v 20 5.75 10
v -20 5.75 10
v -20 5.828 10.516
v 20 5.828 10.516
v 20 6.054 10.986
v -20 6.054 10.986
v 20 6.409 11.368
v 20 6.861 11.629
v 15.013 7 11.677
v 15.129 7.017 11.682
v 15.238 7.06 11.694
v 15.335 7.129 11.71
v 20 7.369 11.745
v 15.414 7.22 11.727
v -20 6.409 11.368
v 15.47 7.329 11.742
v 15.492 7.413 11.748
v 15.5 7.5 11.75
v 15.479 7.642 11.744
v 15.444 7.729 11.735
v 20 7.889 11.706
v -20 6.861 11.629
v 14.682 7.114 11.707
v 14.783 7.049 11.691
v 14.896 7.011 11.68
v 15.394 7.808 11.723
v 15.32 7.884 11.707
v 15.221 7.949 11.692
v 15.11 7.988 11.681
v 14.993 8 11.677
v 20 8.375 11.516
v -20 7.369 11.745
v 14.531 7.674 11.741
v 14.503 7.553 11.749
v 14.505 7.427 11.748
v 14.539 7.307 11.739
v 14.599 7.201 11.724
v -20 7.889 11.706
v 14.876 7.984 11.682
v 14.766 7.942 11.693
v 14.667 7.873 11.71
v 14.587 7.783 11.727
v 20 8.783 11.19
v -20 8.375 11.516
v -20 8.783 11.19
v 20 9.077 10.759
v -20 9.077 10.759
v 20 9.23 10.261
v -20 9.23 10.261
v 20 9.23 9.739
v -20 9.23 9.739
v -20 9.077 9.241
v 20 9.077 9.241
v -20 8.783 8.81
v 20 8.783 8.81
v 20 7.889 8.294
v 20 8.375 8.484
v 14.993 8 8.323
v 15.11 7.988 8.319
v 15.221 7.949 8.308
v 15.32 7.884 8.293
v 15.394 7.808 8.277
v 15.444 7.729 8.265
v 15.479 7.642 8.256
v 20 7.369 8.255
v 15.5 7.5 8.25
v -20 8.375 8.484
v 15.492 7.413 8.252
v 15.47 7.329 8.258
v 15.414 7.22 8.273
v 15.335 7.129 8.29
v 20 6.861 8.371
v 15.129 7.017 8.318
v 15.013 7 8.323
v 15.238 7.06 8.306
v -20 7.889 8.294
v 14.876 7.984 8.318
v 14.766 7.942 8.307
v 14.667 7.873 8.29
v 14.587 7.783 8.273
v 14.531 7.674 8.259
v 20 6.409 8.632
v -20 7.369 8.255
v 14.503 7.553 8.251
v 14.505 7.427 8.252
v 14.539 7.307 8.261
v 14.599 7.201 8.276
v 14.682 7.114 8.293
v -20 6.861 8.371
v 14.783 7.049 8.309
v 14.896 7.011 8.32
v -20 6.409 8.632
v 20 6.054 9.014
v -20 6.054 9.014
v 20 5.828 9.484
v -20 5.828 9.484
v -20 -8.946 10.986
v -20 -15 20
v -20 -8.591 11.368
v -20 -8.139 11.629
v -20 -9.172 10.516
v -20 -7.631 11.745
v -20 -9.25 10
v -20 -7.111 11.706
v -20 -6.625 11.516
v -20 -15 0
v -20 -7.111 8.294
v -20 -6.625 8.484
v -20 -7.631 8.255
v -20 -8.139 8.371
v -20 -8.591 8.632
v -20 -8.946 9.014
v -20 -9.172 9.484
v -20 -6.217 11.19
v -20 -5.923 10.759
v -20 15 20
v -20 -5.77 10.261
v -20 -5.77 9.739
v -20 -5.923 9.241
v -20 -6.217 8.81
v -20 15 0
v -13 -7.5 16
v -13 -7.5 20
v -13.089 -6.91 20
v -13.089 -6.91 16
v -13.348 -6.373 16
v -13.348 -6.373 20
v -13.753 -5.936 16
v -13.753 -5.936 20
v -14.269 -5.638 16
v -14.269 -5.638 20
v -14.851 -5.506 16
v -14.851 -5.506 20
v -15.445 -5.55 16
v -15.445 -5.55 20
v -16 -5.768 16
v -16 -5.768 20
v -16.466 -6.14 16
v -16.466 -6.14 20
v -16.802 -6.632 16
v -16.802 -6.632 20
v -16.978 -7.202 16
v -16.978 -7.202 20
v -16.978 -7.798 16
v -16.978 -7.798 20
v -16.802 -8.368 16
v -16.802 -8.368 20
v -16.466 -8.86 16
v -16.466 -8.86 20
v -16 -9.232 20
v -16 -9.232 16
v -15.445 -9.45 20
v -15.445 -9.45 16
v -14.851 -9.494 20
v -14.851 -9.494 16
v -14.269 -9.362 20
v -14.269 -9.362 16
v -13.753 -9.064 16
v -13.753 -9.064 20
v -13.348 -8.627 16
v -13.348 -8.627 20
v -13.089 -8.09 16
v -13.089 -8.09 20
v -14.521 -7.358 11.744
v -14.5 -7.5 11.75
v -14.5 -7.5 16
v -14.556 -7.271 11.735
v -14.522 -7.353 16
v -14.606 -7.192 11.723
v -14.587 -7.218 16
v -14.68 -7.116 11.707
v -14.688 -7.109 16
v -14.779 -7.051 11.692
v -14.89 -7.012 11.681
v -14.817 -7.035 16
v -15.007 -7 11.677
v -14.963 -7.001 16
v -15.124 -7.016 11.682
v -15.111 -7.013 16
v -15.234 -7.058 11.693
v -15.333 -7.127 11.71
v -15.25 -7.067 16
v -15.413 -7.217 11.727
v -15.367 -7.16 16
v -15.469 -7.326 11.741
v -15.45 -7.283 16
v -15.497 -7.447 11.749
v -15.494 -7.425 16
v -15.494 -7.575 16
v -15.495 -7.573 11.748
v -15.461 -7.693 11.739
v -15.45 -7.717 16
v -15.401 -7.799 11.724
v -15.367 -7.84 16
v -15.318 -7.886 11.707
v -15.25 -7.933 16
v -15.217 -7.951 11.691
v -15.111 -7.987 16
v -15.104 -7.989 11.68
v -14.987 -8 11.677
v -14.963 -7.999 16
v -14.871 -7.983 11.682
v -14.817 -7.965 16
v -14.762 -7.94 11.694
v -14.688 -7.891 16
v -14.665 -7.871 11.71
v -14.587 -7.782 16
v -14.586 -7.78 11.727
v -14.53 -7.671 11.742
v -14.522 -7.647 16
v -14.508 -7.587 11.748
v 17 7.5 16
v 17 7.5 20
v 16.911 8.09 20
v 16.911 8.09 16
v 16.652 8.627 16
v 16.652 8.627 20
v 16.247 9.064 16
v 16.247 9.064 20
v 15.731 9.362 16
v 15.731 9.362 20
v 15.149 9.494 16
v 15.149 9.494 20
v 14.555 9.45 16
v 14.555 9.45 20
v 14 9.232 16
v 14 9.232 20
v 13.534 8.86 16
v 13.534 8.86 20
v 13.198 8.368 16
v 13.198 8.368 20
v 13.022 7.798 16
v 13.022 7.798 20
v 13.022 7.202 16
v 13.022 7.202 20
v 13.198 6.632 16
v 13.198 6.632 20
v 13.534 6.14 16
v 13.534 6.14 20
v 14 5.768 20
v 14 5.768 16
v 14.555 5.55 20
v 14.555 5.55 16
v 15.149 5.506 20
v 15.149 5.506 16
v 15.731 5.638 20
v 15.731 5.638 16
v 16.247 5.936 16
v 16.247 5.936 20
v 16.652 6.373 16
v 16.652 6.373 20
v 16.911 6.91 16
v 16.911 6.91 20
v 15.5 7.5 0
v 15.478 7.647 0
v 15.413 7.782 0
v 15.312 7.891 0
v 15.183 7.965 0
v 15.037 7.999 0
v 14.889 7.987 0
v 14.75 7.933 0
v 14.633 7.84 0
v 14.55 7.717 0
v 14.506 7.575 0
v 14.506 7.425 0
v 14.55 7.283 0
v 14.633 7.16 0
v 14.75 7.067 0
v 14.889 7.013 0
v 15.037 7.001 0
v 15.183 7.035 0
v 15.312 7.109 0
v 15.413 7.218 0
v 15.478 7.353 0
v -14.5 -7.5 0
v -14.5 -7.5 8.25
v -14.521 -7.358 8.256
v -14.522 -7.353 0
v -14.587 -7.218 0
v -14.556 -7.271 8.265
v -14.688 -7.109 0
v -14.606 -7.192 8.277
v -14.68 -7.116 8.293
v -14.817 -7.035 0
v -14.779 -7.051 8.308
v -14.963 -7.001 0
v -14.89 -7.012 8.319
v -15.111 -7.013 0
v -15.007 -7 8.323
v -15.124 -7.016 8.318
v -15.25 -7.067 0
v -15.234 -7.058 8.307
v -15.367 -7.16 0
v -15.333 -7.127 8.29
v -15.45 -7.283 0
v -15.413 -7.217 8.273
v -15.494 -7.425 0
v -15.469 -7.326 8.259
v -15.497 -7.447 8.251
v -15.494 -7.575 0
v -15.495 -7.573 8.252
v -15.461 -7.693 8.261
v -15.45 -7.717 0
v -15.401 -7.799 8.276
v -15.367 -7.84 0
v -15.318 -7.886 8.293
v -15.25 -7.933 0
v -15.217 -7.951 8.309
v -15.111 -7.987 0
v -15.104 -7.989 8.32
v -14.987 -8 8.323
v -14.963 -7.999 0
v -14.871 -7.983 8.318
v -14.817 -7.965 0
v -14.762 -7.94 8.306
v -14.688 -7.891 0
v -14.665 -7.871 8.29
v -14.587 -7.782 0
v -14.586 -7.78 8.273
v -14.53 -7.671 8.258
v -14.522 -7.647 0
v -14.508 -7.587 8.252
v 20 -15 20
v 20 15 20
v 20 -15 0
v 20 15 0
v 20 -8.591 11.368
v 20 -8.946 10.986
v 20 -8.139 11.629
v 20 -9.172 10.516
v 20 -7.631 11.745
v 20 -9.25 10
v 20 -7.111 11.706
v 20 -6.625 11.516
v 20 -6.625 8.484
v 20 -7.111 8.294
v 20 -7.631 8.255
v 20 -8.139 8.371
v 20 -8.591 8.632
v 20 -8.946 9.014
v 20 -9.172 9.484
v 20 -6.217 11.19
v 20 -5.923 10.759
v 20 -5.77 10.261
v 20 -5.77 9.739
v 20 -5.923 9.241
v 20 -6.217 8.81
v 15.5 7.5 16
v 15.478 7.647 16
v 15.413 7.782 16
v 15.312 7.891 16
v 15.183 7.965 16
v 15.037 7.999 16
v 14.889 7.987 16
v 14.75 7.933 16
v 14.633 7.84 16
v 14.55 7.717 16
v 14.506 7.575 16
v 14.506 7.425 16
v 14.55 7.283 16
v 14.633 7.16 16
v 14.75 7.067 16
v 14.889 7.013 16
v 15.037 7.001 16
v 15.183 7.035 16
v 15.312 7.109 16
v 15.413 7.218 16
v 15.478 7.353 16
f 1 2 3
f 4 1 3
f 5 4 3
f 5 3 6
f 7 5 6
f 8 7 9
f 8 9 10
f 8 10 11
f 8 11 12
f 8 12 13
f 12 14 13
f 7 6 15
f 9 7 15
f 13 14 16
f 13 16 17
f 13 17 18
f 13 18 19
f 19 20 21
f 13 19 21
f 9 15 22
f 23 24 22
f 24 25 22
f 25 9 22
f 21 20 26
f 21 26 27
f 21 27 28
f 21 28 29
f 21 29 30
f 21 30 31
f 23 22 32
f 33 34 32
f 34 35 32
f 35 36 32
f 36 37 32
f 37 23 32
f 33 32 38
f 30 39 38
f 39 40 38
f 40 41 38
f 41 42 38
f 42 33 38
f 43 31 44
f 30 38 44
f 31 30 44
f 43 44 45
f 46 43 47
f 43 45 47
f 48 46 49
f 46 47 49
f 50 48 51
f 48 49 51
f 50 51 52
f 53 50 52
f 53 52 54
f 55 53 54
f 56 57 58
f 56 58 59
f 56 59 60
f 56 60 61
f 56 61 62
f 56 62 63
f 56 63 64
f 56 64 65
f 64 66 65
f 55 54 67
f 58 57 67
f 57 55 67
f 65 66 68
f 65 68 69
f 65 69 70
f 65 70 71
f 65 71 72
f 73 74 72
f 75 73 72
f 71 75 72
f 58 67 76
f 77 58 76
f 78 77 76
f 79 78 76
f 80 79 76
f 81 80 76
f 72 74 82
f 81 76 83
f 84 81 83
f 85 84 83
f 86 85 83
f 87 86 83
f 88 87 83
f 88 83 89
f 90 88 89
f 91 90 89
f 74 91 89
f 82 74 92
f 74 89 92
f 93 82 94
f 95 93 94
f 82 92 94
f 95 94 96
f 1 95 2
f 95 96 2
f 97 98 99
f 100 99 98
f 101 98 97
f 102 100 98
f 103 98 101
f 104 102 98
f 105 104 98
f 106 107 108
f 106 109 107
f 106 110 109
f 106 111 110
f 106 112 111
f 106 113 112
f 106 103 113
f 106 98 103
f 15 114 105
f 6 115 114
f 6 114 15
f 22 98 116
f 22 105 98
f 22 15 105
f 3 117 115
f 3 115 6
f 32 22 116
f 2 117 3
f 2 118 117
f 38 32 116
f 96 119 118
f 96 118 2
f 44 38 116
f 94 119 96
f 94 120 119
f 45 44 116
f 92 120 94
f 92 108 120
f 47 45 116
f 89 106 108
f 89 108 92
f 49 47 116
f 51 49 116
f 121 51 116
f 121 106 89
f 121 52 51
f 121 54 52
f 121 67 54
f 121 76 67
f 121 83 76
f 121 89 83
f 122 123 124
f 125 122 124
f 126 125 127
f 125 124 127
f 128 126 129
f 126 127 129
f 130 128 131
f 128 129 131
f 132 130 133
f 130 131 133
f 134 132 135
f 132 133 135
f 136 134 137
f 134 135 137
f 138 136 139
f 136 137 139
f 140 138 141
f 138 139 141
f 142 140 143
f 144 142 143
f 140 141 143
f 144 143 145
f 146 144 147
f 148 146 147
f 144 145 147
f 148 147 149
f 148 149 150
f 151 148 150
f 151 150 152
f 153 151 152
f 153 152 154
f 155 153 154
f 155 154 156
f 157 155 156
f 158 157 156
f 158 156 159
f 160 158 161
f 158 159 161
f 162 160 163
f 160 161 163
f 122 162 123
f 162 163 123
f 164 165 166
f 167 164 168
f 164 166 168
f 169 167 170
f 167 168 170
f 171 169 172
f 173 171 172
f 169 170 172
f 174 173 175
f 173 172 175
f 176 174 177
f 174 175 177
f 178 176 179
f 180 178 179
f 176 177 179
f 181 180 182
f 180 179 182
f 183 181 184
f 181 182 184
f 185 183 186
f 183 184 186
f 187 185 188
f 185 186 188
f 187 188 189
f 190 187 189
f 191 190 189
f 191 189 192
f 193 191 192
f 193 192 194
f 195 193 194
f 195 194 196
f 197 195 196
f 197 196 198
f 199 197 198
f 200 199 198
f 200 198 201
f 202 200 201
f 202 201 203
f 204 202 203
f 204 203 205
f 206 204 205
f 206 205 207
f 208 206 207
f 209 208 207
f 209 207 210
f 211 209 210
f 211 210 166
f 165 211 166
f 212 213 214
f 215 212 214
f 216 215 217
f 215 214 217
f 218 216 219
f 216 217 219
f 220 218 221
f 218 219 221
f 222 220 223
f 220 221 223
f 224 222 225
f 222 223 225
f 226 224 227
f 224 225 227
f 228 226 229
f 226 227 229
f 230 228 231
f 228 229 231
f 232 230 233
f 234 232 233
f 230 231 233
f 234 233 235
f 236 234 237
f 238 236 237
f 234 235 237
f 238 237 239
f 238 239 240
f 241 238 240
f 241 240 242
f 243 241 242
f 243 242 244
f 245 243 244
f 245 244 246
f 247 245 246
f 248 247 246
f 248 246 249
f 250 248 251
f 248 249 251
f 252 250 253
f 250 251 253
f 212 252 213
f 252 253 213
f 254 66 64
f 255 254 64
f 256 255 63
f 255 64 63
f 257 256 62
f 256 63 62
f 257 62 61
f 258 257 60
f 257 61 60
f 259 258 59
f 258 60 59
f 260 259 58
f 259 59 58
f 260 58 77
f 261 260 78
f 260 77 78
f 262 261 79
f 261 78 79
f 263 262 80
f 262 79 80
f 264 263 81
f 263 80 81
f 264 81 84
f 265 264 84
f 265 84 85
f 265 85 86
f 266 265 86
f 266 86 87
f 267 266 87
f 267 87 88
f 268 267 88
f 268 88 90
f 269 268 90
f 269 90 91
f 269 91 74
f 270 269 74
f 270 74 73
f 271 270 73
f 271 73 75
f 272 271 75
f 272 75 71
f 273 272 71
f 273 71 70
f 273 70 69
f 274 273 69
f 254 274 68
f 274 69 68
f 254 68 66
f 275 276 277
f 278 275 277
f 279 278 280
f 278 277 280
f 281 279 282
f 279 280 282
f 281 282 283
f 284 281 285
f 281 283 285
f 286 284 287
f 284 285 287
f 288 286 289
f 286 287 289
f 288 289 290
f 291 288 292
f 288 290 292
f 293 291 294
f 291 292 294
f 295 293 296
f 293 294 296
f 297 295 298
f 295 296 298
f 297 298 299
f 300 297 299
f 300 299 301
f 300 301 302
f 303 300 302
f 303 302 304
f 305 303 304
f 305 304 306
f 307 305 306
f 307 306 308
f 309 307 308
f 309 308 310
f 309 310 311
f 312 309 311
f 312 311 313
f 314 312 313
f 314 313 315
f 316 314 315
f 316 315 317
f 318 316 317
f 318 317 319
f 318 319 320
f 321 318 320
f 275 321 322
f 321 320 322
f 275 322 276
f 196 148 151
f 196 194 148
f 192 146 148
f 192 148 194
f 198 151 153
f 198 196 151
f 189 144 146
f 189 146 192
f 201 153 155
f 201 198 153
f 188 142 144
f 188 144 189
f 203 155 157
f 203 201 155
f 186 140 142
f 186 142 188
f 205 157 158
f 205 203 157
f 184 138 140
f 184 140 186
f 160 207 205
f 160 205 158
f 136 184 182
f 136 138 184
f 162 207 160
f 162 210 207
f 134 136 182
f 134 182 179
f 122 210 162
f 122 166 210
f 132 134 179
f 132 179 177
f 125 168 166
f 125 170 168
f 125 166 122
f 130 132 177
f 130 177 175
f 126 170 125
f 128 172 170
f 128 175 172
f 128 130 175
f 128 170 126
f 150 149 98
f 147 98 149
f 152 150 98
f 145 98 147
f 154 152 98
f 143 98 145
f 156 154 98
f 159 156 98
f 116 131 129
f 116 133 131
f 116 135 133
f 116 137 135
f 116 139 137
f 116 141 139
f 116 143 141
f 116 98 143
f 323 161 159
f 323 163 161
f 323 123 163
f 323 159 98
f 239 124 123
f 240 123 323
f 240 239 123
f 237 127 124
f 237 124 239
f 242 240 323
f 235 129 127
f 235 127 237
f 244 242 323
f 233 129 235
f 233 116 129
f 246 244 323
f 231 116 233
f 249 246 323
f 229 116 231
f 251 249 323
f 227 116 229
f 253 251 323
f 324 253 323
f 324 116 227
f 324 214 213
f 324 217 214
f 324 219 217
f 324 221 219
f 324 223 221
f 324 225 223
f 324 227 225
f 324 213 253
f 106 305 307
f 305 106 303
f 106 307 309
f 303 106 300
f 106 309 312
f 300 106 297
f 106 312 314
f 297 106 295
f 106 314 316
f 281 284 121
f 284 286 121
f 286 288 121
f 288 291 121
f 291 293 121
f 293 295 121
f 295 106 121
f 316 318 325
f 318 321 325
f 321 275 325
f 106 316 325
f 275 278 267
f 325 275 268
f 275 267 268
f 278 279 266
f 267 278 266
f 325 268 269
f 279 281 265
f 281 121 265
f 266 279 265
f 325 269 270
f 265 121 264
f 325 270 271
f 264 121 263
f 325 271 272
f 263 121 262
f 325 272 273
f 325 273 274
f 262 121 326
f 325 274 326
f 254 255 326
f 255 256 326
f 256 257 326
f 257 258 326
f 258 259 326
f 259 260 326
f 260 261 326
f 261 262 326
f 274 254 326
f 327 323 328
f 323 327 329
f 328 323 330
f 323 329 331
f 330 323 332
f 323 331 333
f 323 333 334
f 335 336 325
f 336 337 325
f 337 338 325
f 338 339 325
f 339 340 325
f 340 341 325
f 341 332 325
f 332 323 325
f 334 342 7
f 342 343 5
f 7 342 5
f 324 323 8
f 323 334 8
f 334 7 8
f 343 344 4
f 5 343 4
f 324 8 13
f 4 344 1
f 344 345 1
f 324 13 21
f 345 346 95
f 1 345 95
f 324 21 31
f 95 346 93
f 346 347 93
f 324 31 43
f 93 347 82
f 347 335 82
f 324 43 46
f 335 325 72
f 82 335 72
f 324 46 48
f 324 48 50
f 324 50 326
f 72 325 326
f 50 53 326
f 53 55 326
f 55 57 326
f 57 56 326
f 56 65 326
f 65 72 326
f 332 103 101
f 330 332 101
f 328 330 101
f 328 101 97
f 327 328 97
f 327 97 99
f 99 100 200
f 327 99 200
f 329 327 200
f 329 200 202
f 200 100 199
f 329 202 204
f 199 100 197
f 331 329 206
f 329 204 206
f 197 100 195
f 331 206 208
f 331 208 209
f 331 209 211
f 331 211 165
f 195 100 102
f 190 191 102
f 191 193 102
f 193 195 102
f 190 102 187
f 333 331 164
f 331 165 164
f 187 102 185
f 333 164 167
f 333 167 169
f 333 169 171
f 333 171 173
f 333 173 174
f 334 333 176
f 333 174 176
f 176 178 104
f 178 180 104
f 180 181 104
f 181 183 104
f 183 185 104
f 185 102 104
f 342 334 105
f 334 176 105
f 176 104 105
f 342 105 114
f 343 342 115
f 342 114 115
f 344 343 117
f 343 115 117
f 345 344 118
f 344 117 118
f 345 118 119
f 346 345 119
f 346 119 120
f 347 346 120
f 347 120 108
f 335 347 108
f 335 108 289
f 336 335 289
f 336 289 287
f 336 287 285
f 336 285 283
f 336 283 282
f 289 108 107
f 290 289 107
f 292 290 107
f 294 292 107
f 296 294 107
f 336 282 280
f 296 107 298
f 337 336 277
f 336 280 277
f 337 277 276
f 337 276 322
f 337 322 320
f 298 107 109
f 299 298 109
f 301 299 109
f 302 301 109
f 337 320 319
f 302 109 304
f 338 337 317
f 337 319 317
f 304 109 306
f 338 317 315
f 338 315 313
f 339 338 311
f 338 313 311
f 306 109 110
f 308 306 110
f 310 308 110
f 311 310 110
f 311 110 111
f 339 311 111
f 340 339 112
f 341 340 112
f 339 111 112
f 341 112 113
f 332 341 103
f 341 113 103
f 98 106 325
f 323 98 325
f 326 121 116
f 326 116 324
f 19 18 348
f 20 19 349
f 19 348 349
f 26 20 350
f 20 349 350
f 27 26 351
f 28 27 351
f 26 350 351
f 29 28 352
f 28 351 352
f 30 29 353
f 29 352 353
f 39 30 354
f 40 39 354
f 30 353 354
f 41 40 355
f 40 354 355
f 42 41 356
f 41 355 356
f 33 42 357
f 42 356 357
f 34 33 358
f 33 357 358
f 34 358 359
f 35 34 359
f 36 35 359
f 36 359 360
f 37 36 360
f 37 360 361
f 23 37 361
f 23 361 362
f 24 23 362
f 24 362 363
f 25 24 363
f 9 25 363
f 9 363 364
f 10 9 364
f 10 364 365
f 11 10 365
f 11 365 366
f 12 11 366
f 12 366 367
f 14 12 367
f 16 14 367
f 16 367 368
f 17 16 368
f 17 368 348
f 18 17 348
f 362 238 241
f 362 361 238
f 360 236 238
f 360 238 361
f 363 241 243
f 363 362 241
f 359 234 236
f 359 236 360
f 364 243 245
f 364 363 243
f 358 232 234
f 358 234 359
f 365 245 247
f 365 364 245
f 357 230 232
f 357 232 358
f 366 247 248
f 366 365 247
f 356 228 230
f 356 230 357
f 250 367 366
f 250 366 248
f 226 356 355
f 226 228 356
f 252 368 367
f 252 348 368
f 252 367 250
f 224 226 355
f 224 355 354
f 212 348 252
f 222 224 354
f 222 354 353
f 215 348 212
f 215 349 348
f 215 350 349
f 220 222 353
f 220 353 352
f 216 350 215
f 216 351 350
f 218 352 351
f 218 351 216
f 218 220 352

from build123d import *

# Parameters (mm, degrees)
F0_W     = 40
F0_H     = 30
F1_DEPTH = 20
F2_R     = 1.75
F3_DEPTH = 40.001
F4_R     = 2
F5_DEPTH = 4
F6_R     = 0.5
F7_DEPTH = 16.001


with BuildPart() as f1:
    # F0 (on Top) → F1 (new body)
    with BuildSketch(Plane.XY):
        Rectangle(F0_W, F0_H)
    extrude(amount=F1_DEPTH)

    # F2 (on face) → F3 (cut, through all)
    with BuildSketch(Plane(origin=(-20, 0, 0), x_dir=(0, -1, 0), z_dir=(-1, 0, 0))):
        with Locations((-7.5, 10)):
            Circle(F2_R)
        with Locations((7.5, 10)):
            Circle(F2_R)
    extrude(amount=-F3_DEPTH, mode=Mode.SUBTRACT)

    # F4 (on face) → F5 (cut)
    with BuildSketch(Plane.XY.offset(20)):
        with Locations((15, 7.5)):
            Circle(F4_R)
        with Locations((-15, -7.5)):
            Circle(F4_R)
    extrude(amount=-F5_DEPTH, mode=Mode.SUBTRACT)

    # F6 (on face) → F7 (cut, through all)
    with BuildSketch(Plane.XY.offset(16)):
        with Locations((15, 7.5)):
            Circle(F6_R)
        with Locations((-15, -7.5)):
            Circle(F6_R)
    extrude(amount=-F7_DEPTH, mode=Mode.SUBTRACT)


solid = f1.part
